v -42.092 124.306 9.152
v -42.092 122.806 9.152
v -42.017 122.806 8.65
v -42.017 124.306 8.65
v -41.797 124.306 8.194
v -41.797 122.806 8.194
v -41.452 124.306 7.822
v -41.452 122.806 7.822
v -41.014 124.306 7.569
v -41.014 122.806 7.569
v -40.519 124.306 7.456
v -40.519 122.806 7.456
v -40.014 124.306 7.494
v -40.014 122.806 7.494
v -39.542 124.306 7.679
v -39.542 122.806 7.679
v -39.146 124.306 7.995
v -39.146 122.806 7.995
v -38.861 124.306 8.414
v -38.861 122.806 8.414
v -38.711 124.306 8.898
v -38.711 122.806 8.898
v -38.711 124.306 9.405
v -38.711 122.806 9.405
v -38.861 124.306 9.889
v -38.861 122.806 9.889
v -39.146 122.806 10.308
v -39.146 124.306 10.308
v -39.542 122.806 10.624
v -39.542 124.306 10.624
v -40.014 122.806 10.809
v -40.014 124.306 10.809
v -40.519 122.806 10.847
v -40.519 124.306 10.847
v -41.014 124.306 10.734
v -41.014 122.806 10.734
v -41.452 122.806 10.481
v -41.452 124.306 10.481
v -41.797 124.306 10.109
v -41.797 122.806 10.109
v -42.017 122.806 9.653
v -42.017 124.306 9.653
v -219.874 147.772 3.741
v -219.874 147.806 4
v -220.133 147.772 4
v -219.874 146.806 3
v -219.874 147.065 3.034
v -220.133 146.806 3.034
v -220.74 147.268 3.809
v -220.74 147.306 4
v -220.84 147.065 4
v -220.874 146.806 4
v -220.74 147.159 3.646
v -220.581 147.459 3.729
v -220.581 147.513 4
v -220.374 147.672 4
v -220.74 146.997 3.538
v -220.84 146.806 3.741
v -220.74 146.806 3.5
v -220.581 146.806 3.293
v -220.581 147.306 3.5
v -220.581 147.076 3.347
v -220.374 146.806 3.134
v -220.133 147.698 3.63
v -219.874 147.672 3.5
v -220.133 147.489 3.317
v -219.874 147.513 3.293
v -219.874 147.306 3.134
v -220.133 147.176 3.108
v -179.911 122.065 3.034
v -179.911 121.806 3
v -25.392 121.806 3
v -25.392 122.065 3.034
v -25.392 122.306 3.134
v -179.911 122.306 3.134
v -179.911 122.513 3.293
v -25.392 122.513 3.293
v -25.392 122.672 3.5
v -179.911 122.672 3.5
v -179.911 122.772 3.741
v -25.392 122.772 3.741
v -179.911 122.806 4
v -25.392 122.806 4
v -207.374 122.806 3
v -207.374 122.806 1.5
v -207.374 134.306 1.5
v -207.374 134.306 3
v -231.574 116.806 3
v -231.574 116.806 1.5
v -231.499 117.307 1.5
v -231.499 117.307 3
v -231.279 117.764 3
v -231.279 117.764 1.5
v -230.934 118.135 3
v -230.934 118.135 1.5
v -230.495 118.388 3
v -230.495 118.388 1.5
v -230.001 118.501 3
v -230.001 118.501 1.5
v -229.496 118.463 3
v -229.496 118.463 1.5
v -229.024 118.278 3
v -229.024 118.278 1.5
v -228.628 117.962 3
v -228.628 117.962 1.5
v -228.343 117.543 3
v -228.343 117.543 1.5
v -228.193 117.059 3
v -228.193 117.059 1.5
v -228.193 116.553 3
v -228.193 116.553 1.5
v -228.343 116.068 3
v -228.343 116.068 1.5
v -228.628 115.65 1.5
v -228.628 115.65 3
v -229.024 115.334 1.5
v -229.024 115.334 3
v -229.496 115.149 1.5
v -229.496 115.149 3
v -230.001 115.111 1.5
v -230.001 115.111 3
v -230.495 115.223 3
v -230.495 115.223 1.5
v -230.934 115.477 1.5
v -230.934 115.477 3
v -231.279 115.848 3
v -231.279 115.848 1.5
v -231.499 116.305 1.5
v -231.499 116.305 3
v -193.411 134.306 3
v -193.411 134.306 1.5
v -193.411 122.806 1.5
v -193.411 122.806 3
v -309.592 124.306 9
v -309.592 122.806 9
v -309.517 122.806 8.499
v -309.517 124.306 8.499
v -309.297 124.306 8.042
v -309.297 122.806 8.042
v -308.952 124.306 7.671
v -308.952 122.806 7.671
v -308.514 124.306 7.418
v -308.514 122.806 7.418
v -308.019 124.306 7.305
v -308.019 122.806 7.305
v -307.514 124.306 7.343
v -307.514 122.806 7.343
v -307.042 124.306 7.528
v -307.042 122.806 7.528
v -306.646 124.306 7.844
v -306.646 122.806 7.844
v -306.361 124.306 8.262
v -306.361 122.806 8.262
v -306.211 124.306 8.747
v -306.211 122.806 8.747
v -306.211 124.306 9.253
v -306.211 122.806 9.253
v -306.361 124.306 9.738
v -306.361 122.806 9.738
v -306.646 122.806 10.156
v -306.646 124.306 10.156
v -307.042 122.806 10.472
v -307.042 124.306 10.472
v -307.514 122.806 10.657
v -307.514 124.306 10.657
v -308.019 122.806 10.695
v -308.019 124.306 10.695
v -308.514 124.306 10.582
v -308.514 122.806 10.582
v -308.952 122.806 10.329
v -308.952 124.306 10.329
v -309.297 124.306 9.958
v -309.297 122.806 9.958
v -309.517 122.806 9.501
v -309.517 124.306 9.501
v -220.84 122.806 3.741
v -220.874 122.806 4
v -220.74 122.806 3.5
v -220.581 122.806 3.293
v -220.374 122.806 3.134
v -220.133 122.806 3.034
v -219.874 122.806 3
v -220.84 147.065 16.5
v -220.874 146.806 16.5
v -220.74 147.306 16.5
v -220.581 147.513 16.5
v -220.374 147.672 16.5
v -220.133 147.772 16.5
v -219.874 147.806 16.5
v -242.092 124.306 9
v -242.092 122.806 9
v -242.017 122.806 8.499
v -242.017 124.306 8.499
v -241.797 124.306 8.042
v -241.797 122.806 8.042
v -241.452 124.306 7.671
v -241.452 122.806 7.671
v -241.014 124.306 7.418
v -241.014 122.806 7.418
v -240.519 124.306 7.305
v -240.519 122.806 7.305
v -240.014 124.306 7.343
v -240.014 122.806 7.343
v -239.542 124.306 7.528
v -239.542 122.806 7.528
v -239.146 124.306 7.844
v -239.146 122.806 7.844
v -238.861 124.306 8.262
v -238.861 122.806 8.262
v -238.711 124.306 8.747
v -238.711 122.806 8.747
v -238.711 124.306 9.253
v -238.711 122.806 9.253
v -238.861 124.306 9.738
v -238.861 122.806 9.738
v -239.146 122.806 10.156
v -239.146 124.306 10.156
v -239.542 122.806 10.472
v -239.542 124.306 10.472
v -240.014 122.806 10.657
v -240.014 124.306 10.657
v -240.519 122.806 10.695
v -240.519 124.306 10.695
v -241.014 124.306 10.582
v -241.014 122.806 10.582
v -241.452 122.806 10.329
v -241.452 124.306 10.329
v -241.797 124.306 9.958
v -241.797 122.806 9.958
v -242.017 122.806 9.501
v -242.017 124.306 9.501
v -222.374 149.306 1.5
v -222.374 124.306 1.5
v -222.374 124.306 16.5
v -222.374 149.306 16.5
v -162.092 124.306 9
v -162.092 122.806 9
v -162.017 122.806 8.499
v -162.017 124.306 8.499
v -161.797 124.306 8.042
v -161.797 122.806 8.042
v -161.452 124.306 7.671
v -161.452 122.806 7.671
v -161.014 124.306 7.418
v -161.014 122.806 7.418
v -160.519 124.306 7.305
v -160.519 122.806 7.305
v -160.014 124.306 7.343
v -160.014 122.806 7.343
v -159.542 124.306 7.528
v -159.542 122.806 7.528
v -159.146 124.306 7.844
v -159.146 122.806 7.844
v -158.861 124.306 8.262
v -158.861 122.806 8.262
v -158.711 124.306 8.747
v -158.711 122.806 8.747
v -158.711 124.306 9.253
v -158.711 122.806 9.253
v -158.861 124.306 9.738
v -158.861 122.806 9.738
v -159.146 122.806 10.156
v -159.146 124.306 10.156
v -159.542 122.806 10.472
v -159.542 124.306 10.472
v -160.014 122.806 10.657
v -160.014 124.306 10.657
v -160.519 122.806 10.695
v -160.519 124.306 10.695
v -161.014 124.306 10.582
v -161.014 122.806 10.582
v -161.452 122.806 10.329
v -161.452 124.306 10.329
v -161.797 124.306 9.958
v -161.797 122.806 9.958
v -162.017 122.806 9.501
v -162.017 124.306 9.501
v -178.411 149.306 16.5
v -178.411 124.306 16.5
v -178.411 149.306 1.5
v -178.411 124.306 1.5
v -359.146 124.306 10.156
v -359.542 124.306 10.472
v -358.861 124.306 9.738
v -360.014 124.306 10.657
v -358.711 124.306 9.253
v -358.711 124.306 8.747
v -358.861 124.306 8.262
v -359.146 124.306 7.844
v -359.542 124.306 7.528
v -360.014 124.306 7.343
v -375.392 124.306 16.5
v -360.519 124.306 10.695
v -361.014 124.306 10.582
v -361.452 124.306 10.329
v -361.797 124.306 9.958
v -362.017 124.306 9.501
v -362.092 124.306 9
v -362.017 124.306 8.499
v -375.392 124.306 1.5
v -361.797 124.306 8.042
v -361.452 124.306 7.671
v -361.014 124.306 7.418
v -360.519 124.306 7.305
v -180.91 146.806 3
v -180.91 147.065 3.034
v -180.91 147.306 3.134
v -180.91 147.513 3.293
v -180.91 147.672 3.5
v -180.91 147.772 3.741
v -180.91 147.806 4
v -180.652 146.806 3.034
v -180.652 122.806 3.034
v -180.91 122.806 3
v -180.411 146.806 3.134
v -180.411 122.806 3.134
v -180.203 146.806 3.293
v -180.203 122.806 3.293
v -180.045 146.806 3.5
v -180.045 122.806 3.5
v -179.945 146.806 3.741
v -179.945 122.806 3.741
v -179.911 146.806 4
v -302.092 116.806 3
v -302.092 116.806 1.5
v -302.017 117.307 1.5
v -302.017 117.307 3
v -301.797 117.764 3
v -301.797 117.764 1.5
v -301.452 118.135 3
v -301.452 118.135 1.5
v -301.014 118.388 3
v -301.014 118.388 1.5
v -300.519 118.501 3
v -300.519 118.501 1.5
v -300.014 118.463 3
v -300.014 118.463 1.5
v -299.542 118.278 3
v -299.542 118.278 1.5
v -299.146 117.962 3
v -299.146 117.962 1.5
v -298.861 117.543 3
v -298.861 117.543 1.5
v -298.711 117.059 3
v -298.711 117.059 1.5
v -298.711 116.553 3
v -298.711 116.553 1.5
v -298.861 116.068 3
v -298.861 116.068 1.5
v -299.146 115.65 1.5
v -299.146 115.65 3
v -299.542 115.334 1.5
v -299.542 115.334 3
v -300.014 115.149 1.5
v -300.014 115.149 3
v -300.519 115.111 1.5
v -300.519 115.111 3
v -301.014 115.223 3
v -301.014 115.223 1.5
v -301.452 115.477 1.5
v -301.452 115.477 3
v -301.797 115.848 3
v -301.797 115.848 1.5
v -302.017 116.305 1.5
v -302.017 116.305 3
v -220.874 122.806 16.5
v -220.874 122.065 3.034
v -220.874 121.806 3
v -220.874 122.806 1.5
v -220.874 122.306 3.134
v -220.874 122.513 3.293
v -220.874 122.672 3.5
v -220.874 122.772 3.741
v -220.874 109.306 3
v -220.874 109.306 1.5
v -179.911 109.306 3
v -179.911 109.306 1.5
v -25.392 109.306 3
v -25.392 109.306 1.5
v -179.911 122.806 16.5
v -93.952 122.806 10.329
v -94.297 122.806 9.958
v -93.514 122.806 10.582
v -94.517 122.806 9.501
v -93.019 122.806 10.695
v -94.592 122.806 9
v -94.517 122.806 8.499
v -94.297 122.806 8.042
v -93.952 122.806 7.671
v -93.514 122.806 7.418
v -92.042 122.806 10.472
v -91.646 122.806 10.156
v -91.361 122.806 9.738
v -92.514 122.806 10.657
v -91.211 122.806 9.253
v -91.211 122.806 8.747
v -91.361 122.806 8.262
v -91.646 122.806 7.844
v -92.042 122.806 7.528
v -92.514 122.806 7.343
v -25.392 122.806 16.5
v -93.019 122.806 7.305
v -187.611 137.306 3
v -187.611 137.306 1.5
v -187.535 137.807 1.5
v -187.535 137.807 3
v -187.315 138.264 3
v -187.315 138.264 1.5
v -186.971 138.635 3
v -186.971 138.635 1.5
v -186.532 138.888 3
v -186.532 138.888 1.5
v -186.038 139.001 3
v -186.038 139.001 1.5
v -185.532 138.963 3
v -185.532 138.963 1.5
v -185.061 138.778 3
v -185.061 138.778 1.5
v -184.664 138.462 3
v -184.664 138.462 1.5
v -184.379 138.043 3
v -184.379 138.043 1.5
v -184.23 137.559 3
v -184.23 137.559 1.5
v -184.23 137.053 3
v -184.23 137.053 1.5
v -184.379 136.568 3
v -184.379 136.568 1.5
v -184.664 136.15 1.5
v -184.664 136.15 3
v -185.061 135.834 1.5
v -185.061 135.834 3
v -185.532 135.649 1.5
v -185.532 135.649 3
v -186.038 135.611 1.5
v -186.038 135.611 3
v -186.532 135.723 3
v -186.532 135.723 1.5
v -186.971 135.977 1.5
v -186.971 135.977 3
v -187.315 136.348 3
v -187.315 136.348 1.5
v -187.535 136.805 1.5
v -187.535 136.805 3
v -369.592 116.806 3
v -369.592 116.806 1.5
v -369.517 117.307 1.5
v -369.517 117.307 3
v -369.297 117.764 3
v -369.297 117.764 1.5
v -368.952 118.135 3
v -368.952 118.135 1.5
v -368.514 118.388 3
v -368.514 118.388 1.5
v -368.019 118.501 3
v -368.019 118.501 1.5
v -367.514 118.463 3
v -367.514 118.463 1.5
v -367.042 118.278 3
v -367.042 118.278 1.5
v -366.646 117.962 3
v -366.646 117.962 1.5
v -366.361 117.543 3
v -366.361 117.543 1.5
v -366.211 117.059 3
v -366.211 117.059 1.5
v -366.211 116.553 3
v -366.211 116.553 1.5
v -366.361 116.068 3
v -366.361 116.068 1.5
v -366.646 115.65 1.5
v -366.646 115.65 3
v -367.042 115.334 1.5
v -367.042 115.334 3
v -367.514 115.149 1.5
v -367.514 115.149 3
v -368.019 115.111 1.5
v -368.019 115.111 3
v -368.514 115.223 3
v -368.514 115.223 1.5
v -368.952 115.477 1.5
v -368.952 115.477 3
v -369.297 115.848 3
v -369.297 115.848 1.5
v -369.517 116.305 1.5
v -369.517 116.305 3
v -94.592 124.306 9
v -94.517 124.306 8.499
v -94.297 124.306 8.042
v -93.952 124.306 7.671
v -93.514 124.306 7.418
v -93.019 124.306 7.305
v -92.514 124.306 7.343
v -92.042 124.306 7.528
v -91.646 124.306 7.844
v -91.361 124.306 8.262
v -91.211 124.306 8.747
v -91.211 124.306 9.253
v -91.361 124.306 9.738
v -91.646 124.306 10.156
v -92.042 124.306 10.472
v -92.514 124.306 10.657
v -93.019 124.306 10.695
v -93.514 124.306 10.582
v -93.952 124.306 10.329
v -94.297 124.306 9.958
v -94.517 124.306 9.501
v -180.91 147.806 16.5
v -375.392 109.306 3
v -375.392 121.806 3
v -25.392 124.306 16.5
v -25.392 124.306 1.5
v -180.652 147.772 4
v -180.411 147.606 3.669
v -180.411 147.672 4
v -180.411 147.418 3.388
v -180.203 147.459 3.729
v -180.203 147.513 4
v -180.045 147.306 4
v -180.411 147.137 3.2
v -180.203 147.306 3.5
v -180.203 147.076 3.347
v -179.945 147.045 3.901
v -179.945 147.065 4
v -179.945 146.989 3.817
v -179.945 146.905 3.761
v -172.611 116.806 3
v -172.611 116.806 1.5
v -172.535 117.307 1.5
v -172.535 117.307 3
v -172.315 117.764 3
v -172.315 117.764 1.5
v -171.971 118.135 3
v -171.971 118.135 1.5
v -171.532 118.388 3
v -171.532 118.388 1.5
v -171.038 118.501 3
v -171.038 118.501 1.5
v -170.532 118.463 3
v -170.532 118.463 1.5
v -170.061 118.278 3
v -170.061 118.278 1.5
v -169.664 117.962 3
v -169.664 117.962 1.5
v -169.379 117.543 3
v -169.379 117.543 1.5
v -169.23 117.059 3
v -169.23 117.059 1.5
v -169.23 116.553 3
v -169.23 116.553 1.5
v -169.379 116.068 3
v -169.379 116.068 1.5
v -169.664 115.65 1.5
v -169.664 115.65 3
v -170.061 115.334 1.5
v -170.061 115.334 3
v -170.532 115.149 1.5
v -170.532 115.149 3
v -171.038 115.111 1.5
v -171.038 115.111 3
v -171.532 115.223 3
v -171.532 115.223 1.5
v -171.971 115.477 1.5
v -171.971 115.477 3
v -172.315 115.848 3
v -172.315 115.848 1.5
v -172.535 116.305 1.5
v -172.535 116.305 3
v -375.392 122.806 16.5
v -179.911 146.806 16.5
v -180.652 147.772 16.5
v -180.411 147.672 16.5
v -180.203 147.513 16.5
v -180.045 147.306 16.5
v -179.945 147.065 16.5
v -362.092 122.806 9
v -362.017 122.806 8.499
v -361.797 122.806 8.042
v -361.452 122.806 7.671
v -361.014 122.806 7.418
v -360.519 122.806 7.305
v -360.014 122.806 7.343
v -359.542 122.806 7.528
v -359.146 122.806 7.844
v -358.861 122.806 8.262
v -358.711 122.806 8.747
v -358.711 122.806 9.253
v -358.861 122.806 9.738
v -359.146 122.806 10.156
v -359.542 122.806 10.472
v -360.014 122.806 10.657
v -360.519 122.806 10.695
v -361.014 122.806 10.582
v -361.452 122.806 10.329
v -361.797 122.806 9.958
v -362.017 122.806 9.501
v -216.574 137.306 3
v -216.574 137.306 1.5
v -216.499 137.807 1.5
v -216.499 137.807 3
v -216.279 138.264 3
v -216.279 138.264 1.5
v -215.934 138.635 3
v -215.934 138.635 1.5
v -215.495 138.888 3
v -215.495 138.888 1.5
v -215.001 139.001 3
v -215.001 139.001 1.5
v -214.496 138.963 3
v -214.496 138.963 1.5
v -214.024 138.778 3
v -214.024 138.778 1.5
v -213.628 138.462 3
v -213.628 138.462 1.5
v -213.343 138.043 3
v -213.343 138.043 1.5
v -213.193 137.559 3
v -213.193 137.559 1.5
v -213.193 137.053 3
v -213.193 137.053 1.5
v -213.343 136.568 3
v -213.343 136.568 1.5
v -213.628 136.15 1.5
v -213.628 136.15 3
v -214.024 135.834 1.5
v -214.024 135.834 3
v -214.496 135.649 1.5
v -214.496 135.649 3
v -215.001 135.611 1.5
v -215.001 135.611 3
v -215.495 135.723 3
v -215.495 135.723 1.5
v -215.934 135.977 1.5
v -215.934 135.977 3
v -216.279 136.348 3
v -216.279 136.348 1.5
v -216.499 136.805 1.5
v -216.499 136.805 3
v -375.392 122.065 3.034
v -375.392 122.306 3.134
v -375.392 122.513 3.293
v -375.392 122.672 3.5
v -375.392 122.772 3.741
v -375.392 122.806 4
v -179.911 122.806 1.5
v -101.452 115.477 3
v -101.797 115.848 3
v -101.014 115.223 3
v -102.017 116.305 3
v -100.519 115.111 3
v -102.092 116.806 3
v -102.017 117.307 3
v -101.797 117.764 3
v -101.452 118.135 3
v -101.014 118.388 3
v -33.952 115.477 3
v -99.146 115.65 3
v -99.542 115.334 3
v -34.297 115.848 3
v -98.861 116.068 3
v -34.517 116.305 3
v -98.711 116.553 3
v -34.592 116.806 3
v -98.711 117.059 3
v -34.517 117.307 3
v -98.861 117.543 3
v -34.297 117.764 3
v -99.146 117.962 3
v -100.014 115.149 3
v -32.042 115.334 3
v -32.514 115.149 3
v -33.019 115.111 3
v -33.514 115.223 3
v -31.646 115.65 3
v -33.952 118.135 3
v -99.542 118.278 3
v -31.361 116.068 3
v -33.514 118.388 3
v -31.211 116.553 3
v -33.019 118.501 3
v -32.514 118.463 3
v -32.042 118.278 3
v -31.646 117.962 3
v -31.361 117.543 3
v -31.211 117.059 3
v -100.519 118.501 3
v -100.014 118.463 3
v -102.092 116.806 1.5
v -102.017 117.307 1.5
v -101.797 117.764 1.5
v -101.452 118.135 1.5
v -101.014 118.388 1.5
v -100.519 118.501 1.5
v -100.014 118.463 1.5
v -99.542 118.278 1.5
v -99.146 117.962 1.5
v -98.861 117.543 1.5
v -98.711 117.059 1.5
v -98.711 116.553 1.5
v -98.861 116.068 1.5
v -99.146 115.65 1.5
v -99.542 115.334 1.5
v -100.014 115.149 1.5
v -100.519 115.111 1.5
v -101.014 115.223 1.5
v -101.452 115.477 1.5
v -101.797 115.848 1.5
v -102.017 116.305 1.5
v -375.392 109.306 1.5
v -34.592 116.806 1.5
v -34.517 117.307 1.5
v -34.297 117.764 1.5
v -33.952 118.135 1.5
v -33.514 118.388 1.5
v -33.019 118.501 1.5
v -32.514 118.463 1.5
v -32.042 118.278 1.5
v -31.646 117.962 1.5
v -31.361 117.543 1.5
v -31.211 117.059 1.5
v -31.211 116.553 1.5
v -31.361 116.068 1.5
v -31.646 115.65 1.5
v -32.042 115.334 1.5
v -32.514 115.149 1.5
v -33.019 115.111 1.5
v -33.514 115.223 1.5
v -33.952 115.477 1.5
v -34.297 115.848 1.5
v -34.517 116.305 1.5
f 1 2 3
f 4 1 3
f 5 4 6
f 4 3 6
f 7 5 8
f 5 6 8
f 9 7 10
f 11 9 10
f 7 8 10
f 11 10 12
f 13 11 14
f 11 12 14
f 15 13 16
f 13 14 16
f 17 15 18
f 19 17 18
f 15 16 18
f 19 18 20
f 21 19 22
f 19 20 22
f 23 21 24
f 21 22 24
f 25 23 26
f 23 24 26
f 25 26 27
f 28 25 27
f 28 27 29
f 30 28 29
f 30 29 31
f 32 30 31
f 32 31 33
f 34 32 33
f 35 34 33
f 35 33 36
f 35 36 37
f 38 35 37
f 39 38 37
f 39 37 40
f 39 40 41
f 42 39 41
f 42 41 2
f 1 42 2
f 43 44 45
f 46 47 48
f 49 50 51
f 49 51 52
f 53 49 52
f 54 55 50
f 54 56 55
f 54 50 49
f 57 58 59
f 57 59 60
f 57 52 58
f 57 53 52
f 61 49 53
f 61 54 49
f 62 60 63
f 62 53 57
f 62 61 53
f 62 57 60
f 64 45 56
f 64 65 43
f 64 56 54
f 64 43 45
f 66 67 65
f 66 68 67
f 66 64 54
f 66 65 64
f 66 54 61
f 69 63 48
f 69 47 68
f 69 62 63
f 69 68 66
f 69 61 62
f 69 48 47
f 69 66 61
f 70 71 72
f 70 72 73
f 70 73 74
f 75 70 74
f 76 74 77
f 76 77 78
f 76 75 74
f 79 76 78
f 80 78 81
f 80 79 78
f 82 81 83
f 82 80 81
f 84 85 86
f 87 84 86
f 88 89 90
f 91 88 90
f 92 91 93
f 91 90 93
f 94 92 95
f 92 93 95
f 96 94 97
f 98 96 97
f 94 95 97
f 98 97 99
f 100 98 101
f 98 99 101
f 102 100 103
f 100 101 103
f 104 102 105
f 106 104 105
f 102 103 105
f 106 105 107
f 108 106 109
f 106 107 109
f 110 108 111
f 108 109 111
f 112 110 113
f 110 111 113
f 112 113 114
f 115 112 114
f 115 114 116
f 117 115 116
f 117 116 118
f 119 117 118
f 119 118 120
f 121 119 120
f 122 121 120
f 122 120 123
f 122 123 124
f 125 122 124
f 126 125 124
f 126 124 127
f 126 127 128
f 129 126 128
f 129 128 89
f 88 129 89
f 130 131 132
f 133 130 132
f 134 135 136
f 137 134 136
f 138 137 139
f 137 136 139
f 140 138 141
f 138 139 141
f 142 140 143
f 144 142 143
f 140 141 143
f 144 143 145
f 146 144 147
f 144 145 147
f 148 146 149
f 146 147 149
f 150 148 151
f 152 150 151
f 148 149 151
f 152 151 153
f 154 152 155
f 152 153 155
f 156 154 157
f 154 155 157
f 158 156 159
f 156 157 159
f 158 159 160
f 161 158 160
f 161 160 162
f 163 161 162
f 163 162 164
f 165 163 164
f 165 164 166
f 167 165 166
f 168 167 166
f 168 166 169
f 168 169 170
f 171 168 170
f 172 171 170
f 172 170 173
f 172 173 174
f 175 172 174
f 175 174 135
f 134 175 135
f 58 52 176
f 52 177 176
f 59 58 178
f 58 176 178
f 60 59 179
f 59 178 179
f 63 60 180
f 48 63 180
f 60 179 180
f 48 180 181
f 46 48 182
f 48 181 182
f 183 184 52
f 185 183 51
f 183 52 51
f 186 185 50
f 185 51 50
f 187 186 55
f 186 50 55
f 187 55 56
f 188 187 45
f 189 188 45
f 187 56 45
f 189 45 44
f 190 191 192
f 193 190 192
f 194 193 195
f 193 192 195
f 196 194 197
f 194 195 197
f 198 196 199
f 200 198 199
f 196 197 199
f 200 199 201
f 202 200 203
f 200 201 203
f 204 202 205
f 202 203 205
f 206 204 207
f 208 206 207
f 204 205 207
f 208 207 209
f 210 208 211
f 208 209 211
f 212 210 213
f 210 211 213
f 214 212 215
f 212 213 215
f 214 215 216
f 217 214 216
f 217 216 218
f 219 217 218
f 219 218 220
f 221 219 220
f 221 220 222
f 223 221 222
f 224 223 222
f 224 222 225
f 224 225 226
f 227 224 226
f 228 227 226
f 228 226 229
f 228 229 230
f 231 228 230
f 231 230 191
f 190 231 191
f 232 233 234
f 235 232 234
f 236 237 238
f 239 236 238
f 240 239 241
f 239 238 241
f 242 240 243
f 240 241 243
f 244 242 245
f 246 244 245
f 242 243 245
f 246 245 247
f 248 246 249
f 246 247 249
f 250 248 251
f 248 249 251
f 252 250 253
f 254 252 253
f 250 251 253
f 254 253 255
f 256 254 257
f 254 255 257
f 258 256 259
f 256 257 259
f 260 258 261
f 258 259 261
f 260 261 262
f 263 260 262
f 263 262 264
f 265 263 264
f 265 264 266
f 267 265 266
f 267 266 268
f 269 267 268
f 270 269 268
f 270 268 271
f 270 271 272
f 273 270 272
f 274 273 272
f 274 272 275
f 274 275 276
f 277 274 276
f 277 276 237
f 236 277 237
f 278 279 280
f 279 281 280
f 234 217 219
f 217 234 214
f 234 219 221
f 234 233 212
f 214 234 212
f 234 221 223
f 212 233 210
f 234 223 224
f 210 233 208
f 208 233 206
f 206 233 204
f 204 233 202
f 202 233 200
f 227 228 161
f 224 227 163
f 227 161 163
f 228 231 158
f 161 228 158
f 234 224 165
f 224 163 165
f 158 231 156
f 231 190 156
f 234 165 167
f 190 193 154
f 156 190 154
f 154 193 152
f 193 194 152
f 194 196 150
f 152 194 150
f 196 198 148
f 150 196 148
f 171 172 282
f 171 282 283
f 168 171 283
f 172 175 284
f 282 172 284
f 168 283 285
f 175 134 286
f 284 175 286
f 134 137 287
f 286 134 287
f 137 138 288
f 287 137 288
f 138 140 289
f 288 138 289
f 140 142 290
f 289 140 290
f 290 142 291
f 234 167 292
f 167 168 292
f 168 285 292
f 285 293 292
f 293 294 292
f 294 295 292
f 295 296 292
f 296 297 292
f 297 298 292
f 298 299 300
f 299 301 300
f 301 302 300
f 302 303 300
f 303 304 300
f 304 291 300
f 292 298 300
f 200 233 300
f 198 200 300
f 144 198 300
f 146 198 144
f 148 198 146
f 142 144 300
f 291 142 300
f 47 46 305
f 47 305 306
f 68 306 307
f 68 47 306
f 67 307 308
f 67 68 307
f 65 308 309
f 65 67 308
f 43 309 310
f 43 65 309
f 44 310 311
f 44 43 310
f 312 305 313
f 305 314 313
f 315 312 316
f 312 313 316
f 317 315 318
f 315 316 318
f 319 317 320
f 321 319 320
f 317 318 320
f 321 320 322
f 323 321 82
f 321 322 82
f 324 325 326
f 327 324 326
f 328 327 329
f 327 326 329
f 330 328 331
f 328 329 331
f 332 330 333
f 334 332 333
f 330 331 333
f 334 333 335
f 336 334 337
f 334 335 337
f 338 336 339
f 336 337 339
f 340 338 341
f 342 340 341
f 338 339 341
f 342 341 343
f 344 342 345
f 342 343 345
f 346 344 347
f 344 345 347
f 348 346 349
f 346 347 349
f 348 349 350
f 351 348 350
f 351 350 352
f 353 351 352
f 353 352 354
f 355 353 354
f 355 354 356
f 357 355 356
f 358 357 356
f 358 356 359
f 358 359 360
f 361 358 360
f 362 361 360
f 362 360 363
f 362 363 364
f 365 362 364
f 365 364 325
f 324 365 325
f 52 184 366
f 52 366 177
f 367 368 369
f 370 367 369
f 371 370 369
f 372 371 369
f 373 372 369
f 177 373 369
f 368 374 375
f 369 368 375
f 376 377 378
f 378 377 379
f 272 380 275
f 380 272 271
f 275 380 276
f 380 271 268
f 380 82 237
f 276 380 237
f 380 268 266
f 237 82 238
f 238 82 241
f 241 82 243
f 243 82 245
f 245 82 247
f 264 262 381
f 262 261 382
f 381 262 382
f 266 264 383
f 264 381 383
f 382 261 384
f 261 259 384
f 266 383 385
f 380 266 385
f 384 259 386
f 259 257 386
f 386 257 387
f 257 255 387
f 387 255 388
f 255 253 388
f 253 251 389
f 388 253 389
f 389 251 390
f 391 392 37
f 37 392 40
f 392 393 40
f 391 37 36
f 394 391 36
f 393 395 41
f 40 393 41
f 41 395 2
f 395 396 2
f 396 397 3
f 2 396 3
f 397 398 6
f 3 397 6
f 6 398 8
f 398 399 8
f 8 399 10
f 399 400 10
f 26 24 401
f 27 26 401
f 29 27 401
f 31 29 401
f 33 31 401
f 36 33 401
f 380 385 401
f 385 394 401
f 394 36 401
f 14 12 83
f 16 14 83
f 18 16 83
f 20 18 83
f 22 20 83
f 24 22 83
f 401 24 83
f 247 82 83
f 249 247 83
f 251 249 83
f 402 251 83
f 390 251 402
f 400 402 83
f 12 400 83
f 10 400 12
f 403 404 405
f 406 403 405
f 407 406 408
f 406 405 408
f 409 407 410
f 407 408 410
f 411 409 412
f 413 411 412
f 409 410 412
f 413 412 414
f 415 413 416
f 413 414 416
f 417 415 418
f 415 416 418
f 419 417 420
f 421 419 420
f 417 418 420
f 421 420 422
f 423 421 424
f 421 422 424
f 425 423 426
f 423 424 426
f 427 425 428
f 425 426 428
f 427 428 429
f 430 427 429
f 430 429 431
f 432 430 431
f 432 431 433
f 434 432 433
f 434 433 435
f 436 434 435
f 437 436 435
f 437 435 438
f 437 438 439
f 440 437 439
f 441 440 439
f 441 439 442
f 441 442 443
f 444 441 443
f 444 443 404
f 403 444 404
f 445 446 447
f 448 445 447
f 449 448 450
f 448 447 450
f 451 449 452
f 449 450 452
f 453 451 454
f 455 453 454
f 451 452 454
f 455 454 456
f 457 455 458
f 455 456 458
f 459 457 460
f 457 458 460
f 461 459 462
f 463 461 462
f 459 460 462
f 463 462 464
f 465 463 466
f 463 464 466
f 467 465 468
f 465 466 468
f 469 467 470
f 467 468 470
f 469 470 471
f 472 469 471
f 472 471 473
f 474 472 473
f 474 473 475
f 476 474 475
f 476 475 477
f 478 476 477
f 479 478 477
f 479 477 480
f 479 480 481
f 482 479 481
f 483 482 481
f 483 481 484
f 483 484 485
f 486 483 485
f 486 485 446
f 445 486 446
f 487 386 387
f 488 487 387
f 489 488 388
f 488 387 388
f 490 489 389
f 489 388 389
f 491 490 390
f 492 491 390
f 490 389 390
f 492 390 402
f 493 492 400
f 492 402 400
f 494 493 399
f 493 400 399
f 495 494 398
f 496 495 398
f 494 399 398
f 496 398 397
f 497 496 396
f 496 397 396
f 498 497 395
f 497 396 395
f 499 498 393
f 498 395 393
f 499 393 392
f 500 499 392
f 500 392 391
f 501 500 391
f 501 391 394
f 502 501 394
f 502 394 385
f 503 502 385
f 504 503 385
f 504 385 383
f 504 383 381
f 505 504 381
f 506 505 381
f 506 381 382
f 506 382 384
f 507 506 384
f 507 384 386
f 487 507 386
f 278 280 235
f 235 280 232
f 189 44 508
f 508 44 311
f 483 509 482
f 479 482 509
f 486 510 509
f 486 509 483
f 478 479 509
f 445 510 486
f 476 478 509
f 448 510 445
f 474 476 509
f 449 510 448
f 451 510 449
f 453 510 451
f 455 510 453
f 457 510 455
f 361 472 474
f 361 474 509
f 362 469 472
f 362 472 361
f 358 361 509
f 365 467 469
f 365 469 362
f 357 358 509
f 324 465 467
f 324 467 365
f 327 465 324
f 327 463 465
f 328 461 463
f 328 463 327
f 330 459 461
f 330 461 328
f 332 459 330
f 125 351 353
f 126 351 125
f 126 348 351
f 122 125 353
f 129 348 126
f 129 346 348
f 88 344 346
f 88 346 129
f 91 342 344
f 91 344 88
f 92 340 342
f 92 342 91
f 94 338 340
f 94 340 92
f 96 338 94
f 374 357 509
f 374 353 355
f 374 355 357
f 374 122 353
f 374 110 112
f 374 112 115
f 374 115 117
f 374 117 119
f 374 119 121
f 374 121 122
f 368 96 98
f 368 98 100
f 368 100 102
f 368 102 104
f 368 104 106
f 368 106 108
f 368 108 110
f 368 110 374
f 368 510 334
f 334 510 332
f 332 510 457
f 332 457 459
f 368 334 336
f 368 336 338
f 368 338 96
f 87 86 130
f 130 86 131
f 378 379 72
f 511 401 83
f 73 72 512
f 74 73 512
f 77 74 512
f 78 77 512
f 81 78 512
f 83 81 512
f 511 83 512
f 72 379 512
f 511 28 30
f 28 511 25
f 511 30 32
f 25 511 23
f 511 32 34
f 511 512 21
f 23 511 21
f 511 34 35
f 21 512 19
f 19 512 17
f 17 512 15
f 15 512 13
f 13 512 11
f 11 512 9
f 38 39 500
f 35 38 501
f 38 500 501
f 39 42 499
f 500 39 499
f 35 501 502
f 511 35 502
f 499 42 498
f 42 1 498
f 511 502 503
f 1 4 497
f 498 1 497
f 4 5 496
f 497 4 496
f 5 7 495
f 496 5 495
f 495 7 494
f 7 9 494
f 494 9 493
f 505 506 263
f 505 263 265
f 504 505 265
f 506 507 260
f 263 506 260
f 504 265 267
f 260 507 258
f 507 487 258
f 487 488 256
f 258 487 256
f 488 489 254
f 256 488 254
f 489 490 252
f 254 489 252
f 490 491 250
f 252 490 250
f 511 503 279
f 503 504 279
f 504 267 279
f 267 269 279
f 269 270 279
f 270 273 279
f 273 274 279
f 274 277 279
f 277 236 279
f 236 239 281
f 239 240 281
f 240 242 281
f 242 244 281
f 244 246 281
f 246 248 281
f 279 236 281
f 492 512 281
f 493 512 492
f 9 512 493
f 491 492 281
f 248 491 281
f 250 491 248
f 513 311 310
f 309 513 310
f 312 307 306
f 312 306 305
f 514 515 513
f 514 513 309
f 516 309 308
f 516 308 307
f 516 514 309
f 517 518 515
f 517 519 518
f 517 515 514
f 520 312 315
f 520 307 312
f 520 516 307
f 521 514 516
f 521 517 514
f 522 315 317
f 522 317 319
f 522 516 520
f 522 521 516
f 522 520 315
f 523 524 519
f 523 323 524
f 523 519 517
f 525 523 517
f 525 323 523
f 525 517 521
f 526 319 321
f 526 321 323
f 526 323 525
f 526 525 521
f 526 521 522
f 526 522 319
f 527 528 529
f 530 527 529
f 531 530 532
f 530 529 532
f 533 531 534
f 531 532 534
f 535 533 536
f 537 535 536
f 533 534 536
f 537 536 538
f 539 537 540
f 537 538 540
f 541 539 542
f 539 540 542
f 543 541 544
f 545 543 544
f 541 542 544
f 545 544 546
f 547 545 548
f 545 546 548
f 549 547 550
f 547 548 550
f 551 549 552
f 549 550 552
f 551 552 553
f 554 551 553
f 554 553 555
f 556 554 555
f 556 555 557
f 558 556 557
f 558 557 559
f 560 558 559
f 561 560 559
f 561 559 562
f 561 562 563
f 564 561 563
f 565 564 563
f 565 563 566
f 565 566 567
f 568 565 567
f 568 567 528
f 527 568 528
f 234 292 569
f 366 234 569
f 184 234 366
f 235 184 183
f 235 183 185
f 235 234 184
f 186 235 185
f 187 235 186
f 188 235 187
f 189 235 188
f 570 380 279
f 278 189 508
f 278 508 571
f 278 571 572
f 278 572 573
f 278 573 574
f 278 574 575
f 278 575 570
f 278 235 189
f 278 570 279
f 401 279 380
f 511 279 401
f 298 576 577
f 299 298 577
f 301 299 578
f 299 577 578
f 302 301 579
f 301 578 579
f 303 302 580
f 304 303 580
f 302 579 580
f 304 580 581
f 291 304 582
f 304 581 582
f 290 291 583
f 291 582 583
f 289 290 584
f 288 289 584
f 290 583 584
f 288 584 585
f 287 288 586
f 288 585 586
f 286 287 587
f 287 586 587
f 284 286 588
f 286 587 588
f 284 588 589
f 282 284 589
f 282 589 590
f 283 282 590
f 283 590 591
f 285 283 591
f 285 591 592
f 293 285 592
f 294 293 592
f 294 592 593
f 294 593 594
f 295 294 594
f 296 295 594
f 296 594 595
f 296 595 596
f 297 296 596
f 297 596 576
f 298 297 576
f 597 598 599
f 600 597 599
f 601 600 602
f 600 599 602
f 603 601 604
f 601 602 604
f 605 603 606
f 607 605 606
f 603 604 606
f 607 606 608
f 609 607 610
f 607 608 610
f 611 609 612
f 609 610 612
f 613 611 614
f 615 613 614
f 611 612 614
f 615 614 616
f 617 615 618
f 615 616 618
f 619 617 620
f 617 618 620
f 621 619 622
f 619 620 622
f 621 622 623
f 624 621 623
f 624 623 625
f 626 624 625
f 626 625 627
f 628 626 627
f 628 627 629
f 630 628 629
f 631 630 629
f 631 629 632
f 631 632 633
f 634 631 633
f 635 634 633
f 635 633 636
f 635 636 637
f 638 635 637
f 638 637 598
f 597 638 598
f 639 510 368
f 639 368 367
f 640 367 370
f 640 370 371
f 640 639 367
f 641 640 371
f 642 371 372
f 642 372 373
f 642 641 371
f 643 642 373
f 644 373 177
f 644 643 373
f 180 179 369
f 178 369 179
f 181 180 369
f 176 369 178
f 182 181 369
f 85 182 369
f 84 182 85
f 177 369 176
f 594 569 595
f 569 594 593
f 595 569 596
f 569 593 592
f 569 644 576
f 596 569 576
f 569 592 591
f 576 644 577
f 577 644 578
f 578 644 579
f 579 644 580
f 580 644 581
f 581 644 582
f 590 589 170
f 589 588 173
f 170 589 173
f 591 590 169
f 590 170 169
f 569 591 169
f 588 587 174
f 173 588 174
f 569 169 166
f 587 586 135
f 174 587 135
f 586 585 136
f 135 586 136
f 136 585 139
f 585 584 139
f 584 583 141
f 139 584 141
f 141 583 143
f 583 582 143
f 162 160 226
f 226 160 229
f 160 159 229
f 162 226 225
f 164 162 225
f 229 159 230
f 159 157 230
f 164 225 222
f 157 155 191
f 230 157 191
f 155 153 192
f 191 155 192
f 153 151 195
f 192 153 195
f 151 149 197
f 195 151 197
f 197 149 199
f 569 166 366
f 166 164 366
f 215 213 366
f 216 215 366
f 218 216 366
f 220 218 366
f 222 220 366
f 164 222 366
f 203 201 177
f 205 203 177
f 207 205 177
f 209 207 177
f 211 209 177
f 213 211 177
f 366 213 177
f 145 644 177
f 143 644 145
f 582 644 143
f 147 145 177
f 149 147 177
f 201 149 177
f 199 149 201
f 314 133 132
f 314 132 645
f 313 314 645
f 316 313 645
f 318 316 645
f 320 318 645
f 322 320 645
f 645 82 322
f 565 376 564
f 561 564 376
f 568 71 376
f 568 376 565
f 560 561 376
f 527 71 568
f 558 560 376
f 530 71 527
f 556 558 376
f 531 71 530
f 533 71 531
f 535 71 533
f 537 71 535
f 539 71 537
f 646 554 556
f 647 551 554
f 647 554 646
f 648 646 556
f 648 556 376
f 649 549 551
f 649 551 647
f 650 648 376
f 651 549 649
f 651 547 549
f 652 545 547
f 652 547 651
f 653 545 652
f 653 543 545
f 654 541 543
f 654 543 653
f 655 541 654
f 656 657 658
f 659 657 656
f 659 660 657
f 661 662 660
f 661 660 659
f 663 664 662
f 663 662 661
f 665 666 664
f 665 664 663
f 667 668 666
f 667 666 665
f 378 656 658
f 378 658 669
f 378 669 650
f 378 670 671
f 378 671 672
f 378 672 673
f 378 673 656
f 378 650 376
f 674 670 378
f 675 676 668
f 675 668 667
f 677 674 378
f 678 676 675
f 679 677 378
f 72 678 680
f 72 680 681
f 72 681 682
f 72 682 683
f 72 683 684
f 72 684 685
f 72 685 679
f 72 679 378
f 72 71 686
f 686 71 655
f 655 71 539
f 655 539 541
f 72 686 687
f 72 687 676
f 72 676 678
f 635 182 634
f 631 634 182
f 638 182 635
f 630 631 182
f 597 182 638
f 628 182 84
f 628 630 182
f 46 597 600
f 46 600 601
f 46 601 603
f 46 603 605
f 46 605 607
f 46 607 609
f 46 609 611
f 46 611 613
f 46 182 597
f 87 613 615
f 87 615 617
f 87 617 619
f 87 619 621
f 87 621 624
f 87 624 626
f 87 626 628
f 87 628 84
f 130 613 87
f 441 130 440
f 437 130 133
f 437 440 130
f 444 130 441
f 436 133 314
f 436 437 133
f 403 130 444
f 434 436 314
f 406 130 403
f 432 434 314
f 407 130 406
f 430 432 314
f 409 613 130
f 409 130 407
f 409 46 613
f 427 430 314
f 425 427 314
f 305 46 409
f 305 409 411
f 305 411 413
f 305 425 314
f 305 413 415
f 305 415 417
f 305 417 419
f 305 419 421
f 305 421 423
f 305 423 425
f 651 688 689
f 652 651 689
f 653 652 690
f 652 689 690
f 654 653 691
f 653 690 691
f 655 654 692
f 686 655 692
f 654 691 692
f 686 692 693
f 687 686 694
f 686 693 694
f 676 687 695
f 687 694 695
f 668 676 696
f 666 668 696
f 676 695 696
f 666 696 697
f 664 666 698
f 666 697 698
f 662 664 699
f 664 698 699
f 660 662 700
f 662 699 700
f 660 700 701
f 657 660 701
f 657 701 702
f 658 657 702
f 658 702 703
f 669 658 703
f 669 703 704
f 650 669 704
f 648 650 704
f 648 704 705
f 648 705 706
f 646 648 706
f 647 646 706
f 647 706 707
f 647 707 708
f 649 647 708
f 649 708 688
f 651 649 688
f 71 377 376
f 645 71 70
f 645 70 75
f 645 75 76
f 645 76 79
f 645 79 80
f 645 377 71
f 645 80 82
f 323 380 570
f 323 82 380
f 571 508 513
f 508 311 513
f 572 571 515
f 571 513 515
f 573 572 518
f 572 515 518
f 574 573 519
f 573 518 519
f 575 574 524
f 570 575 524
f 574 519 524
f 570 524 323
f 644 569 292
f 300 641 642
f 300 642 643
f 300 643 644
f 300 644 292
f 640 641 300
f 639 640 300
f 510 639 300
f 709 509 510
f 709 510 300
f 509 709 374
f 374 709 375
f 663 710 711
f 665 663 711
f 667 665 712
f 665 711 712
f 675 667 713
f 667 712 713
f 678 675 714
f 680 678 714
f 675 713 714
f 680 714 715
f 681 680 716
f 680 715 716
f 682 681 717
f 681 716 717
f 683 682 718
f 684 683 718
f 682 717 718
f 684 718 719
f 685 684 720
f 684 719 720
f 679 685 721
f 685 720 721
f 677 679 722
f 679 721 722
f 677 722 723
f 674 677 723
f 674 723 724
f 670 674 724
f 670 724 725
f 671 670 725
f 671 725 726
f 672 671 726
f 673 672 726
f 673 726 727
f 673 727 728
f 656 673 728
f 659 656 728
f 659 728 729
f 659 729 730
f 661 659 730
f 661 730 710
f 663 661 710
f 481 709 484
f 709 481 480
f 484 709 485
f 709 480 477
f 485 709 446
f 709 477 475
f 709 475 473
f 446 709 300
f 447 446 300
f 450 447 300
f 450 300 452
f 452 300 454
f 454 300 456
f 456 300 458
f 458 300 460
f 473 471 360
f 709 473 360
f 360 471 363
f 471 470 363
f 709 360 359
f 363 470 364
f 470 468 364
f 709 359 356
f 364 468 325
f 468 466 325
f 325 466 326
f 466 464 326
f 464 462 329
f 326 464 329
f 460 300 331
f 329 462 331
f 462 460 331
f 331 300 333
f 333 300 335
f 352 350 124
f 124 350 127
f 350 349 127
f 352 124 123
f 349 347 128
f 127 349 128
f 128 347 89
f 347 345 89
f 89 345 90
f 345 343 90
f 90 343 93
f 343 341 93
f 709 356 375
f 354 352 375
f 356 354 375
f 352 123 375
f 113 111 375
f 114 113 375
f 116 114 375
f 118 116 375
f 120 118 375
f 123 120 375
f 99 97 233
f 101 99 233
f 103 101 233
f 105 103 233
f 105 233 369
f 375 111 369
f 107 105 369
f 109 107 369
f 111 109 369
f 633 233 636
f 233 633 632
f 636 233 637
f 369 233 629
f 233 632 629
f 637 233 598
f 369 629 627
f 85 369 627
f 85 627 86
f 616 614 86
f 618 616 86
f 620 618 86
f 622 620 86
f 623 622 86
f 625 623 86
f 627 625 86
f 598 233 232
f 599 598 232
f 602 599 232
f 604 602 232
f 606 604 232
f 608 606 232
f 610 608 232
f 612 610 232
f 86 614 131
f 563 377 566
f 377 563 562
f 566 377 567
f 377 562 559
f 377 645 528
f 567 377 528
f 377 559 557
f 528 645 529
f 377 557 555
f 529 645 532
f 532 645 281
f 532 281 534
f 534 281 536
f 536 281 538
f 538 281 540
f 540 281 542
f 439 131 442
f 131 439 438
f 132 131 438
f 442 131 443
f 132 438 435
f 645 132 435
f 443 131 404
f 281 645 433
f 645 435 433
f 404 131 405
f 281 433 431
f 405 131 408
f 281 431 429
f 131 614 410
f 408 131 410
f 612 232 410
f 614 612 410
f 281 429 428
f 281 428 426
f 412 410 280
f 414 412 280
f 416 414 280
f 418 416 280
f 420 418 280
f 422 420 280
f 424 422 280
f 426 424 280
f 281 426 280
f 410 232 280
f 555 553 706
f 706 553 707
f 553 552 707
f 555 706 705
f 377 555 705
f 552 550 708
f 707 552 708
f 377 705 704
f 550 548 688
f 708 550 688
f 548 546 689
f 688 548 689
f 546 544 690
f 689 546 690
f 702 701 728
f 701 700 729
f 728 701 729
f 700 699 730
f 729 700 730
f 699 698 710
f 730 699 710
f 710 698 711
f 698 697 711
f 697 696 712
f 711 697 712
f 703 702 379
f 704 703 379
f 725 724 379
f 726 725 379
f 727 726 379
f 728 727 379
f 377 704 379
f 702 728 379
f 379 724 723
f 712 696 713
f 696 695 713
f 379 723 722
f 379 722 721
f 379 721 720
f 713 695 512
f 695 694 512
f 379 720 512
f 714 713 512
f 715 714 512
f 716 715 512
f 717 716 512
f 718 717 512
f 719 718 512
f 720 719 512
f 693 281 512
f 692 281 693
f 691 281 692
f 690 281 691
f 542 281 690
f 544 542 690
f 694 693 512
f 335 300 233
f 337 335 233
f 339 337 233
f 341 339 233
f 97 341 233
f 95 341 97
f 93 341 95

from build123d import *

# Parameters (mm, degrees)
BOSS_EXTRU_1_DEPTH      = 1.5
BOSS_EXTRU_2_DEPTH      = 13.5
D_GAGEMENT_M32_D        = 3.4
D_GAGEMENT_M32_DEPTH    = 10
D_GAGEMENT_M32_TIP      = 1.021463052
D_GAGEMENT_M31_D        = 3.4
D_GAGEMENT_M31_DEPTH    = 10
D_GAGEMENT_M31_TIP      = 1.021463052
ESQUISSE12_W            = 13.5
ESQUISSE12_H            = 13.5
ENL_V_MAT_EXTRU_1_DEPTH = 1.5
CONG_1_R                = 1
CONG_2_R                = 1
D_GAGEMENT_M33_D        = 3.4
D_GAGEMENT_M33_DEPTH    = 10
D_GAGEMENT_M33_TIP      = 1.021463052


# Some blends are built 0.0001 mm under size
with BuildPart() as part:
    # Esquisse2 → Boss.-Extru.1 (new body)
    with BuildSketch(Plane.XY.offset(1.5)):
        Polygon((-25.392437762, 124.305889048), (-178.410591433, 124.305889048), (-178.410591433, 149.305889048), (-222.374284091, 149.305889048), (-222.374284091, 124.305889048), (-375.392437762, 124.305889048), (-375.392437762, 109.305889048), (-207.374284091, 109.305889048), (-207.374284091, 134.305889048), (-193.410591433, 134.305889048), (-193.410591433, 109.305889048), (-25.392437762, 109.305889048), align=None)
    extrude(amount=BOSS_EXTRU_1_DEPTH)

    # Esquisse3 → Boss.-Extru.2 (add)
    with BuildSketch(Plane.XY.offset(3)):
        Polygon((-375.392437762, 122.805889048), (-220.874284091, 122.805889048), (-220.874284091, 147.805889048), (-179.910591433, 147.805889048), (-179.910591433, 122.805889048), (-25.392437762, 122.805889048), (-25.392437762, 124.305889048), (-178.410591433, 124.305889048), (-178.410591433, 149.305889048), (-222.374284091, 149.305889048), (-222.374284091, 124.305889048), (-375.392437762, 124.305889048), align=None)
    extrude(amount=BOSS_EXTRU_2_DEPTH)

    # Dégagement M32
    with Locations(Plane(origin=(-229.874284091, 116.805889048, 3), x_dir=(1, 0, 0), z_dir=(0, 0, 1))):
        with Locations((0, 0), (-70.518153671, 0), (-138.018153671, 0), (58.963692658, 0), (129.481846329, 0), (196.981846329, 0)):
            Hole(D_GAGEMENT_M32_D / 2, depth=D_GAGEMENT_M32_DEPTH)
            with Locations((0, 0, -(D_GAGEMENT_M32_DEPTH + D_GAGEMENT_M32_TIP / 2))):  # 118° drill point
                Cone(0, D_GAGEMENT_M32_D / 2, D_GAGEMENT_M32_TIP, mode=Mode.SUBTRACT)

    # Dégagement M31
    with Locations(Plane(origin=(-214.874284091, 137.305889048, 3), x_dir=(1, 0, 0), z_dir=(0, 0, 1))):
        with Locations((0, 0), (28.963692658, 0)):
            Hole(D_GAGEMENT_M31_D / 2, depth=D_GAGEMENT_M31_DEPTH)
            with Locations((0, 0, -(D_GAGEMENT_M31_DEPTH + D_GAGEMENT_M31_TIP / 2))):  # 118° drill point
                Cone(0, D_GAGEMENT_M31_D / 2, D_GAGEMENT_M31_TIP, mode=Mode.SUBTRACT)

    # Esquisse12 → Enlèv. mat.-Extru.1 (cut)
    with BuildSketch(Plane.XY.offset(3)):
        with Locations((-214.124284091, 116.055889048)):
            Rectangle(ESQUISSE12_W, ESQUISSE12_H)
        with Locations((-186.660591433, 116.055889048)):
            Rectangle(ESQUISSE12_W, ESQUISSE12_H)
    extrude(amount=-ENL_V_MAT_EXTRU_1_DEPTH, mode=Mode.SUBTRACT)

    # Congé1
    # the kernel refuses this fillet: 1 mm, written as the material it adds along each edge
    with BuildSketch(Plane(origin=(-179.910591433, 122.805889048, 3), x_dir=(0, -1, 0), z_dir=(1, 0, 0))) as cong_1_piece_1:
        with BuildLine():
            CenterArc((CONG_1_R, -CONG_1_R), CONG_1_R, 90, 90)
            Line((0, -CONG_1_R), (0, 0))
            Line((0, 0), (CONG_1_R, 0))
        make_face()
    extrude(amount=154.518153671)
    with BuildSketch(Plane(origin=(-223.374284091, 147.805889048, 3), x_dir=(0, 0, 1), z_dir=(1, 0, 0))) as cong_1_piece_2_section:
        with BuildLine():
            CenterArc((CONG_1_R, CONG_1_R), CONG_1_R, 180, 90)
            Line((0, CONG_1_R), (0, 0))
            Line((0, 0), (CONG_1_R, 0))
        make_face()
    cong_1_piece_2 = extrude(amount=43.463692658, mode=Mode.PRIVATE)
    cong_1_piece_2 = split(cong_1_piece_2, bisect_by=Plane(origin=(-222.374284091, 147.582521109, 3.223367939), z_dir=(1, 0, 0)), keep=Keep.TOP, mode=Mode.PRIVATE)
    add(cong_1_piece_2)
    with BuildSketch(Plane(origin=(-375.392437762, 122.805889048, 3), x_dir=(0, 0, 1), z_dir=(1, 0, 0))) as cong_1_piece_3:
        with BuildLine():
            CenterArc((CONG_1_R, CONG_1_R), CONG_1_R, 180, 90)
            Line((0, CONG_1_R), (0, 0))
            Line((0, 0), (CONG_1_R, 0))
        make_face()
    extrude(amount=154.518153671)

    # Congé2
    cong_2_edges = [part.edges().sort_by_distance(p)[0] for p in [
        (-179.910591433, 134.805889048, 3),
        (-179.910591433, 147.512995829, 3.292893219),
        (-220.874284091, 147.512995829, 3.292893219),
        (-220.874284091, 134.805889048, 3),
        (-220.874284091, 147.805889048, 10.25),
        (-179.910591433, 147.805889048, 10.25),
    ]]
    fillet(cong_2_edges, radius=CONG_2_R - 0.0001)  # a hair under: the kernel refuses the full size

    # Dégagement M33
    with Locations(Plane(origin=(-92.892437762, 124.305889048, 9), x_dir=(1, 0, 0), z_dir=(0, 1, 0))):
        with Locations((0, 0), (52.5, -0.151530772), (-67.5, 0), (-147.5, 0), (-215, 0), (-267.5, 0)):
            Hole(D_GAGEMENT_M33_D / 2, depth=D_GAGEMENT_M33_DEPTH)
            with Locations((0, 0, -(D_GAGEMENT_M33_DEPTH + D_GAGEMENT_M33_TIP / 2))):  # 118° drill point
                Cone(0, D_GAGEMENT_M33_D / 2, D_GAGEMENT_M33_TIP, mode=Mode.SUBTRACT)


solid = part.part
